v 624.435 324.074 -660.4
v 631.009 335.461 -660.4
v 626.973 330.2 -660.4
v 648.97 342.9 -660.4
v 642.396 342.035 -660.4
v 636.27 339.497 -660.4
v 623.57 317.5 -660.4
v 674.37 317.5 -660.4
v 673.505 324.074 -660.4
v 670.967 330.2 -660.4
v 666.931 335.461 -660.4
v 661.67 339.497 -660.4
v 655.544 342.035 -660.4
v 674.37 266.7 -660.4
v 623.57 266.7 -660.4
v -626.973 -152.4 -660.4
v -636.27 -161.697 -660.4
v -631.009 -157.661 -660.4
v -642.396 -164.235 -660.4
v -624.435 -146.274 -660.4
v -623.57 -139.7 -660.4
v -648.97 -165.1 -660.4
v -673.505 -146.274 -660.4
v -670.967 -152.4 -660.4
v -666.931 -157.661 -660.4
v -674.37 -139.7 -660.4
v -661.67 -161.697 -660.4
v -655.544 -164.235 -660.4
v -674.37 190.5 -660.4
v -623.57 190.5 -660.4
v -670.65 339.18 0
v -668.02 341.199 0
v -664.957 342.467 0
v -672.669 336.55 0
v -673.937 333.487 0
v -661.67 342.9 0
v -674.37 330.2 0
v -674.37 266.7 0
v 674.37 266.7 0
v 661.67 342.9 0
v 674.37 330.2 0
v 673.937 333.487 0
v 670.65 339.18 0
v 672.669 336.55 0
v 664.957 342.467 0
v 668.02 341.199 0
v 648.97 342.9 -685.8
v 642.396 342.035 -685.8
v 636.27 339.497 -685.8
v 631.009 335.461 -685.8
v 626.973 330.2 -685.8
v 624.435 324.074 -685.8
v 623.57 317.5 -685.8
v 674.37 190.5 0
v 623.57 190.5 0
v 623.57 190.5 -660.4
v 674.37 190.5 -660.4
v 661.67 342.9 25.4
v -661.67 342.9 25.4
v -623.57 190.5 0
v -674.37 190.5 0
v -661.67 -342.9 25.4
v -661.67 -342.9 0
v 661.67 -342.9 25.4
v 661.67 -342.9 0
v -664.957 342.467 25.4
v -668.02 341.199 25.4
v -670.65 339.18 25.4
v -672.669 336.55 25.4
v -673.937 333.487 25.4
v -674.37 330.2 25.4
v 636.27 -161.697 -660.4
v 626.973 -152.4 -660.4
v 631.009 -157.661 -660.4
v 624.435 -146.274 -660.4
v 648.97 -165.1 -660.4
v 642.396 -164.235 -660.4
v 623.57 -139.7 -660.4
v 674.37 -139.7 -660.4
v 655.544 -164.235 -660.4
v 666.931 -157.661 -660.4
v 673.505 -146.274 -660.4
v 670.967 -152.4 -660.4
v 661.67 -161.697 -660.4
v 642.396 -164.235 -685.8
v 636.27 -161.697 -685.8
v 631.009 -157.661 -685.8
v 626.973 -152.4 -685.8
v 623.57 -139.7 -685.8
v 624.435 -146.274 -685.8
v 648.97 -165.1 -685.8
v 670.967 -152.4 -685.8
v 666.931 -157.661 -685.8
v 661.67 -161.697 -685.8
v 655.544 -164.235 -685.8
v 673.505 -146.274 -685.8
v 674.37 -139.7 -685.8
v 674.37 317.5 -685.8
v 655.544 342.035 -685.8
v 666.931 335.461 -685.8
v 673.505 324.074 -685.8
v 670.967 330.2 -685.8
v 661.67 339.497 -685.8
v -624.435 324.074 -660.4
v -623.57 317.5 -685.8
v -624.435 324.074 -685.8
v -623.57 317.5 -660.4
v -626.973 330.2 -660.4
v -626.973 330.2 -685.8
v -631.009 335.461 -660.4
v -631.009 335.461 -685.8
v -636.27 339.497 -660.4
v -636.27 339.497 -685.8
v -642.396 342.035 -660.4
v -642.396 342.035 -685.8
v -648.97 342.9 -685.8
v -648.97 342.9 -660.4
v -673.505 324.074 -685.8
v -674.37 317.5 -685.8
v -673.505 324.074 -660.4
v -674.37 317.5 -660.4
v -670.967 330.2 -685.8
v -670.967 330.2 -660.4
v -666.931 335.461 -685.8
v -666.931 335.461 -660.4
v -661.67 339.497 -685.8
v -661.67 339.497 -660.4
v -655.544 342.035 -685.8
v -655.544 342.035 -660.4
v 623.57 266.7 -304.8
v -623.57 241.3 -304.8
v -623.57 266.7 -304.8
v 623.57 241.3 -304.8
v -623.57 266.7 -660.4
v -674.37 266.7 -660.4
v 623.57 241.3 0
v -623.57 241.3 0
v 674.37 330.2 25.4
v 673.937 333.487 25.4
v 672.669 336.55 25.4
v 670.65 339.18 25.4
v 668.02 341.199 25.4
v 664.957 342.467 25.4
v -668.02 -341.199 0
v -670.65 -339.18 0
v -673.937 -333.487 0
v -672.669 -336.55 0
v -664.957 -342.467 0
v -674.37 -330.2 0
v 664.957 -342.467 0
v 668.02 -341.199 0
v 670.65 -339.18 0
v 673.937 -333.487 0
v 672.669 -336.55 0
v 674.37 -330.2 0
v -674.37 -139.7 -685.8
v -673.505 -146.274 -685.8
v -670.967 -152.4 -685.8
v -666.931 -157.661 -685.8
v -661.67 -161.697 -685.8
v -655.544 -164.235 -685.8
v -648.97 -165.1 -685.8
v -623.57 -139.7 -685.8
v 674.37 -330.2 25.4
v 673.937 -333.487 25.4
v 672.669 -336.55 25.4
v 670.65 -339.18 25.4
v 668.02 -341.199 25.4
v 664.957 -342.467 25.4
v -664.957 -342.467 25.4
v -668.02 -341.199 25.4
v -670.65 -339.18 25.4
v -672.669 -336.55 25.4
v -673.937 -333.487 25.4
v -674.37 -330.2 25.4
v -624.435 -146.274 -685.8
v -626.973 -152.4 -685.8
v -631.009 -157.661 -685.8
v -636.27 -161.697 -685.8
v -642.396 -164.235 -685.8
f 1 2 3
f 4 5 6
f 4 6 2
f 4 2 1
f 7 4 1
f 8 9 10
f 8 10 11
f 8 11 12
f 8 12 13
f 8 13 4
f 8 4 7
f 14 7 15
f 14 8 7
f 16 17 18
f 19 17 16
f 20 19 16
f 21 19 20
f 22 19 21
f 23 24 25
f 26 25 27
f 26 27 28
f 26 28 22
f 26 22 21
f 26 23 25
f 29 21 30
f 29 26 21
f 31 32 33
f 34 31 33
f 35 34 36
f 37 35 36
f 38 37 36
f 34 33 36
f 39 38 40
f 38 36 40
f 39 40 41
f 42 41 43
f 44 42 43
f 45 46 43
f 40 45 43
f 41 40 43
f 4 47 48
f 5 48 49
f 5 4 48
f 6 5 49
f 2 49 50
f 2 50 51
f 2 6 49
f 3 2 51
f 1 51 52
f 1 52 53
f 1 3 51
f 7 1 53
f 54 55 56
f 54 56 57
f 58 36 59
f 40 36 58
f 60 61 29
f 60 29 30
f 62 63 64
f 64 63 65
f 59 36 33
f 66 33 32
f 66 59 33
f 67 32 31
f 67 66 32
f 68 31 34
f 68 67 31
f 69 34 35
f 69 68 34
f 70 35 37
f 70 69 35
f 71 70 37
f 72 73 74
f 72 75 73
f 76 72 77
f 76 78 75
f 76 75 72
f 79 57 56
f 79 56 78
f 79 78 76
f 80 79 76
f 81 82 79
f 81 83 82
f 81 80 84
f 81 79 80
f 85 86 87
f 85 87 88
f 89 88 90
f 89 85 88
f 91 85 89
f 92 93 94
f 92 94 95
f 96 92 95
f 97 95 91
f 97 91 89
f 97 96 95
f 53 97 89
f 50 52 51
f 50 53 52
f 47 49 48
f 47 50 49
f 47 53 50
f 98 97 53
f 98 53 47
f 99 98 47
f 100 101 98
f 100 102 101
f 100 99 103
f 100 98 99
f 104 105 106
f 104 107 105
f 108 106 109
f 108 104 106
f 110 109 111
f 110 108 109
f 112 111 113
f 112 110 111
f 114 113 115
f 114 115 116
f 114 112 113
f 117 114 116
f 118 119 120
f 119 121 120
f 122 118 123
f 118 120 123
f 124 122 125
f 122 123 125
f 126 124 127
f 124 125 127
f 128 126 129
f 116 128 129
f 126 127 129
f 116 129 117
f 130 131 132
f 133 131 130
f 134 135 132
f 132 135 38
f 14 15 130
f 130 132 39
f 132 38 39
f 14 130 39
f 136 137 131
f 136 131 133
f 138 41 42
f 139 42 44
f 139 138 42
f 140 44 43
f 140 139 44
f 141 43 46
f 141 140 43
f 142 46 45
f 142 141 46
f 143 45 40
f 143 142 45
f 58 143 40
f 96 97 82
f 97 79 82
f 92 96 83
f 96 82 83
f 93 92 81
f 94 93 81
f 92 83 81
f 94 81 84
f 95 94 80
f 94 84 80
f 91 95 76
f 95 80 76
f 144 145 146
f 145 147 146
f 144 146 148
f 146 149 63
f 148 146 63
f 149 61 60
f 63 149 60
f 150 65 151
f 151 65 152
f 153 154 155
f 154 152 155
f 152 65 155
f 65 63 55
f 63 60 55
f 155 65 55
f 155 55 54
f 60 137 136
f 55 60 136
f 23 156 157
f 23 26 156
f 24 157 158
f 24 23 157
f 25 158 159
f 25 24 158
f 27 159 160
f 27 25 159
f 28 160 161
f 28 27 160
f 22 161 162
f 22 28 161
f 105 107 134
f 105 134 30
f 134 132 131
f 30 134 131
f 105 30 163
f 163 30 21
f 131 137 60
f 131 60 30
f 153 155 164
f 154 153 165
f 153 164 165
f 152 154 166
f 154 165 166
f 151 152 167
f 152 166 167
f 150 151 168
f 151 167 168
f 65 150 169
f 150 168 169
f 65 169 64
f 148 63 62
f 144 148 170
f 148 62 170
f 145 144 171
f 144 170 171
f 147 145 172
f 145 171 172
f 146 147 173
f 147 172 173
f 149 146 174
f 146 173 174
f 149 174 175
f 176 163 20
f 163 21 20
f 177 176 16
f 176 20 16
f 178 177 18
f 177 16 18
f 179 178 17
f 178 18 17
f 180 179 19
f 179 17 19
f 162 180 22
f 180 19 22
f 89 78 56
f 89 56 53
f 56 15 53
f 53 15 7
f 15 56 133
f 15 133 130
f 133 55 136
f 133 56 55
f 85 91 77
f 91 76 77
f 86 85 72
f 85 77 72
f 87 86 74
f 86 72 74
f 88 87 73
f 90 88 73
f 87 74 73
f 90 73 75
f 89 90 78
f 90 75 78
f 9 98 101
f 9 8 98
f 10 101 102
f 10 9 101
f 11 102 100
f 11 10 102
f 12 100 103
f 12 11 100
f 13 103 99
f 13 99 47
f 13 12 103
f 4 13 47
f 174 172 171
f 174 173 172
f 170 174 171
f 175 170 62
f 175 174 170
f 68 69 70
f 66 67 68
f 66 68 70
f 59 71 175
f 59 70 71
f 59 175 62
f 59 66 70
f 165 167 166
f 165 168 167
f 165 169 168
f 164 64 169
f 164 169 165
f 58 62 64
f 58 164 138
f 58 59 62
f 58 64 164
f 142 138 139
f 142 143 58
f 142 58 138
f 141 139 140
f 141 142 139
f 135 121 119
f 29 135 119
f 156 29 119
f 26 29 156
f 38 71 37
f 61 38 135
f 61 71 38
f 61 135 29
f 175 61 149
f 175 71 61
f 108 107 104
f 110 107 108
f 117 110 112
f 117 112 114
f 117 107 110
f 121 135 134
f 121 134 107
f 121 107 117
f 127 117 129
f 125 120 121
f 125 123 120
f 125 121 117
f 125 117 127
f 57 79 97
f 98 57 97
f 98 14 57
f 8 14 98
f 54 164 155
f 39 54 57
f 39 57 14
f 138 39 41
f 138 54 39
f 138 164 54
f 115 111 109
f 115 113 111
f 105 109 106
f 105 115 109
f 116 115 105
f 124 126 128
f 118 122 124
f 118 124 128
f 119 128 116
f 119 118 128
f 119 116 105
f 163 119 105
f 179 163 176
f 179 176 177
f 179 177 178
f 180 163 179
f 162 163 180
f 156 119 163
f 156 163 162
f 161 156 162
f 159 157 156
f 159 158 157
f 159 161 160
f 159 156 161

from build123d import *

# Parameters (mm, degrees)
F0_W     = 1348.74
F0_H     = 685.8
F1_DEPTH = 25.4
F2_W     = 50.8
F2_H     = 76.2
F3_DEPTH = 711.2
F4_W     = 508
F4_H     = 25.4
F4_W_2   = 76.2
F5_DEPTH = 50.8
F6_W     = 355.6
F6_H     = 25.4
F6_W_2   = 76.2
F7_DEPTH = 50.8
F8_W     = 1348.74
F8_H     = 25.4
F9_DEPTH = 304.8
F10_R    = 12.7
F11_R    = 25.39999


# Not quite as in the source:
# - a fillet or chamfer is up to 0.001 mm smaller than in the source, because OpenCascade refuses the exact size


with BuildPart() as f1:
    # F0 (on Top) → F1 (new body)
    with BuildSketch(Plane.XY):
        Rectangle(F0_W, F0_H)
    extrude(amount=F1_DEPTH)

    # F2 (on face) → F3 (join)
    with BuildSketch(Plane.XY.offset(25.4)):
        with Locations((-648.97, 228.6)):
            Rectangle(F2_W, F2_H)
        with Locations((648.97, 228.6)):
            Rectangle(F2_W, F2_H)
    extrude(amount=-F3_DEPTH)

    # F4 (on face) → F5 (join)
    with BuildSketch(Plane(origin=(-674.37, 0, 0), x_dir=(0, -1, 0), z_dir=(-1, 0, 0))):
        with Locations((-88.9, -673.1)):
            Rectangle(F4_W, F4_H)
        with Locations((-304.8, -673.1)):
            Rectangle(F4_W_2, F4_H)
    extrude(amount=-F5_DEPTH)

    # F6 (on face) → F7 (join)
    with BuildSketch(Plane.YZ.offset(674.37)):
        with Locations((12.7, -673.1)):
            Rectangle(F6_W, F6_H)
        with Locations((228.6, -673.1)):
            Rectangle(F6_W_2, F6_H)
        with Locations((304.8, -673.1)):
            Rectangle(F6_W_2, F6_H)
    extrude(amount=-F7_DEPTH)

    # F8 (on face) → F9 (join)
    with BuildSketch(Plane(origin=(0, 0, 0), x_dir=(1, 0, 0), z_dir=(0, 0, -1))):
        with Locations((0, -254)):
            Rectangle(F8_W, F8_H)
    extrude(amount=F9_DEPTH)

    # F10
    f10_edges = [f1.edges().sort_by_distance(p)[0] for p in [
        (674.37, -342.9, 12.7),
        (-674.37, -342.9, 12.7),
        (-674.37, 342.9, 12.7),
        (674.37, 342.9, 12.7),
    ]]
    fillet(f10_edges, radius=F10_R)

    # F11 (radius 25.4 in the source; OpenCascade refuses exactly that, so slightly less here)
    f11_edges = [f1.edges().sort_by_distance(p)[0] for p in [
        (-623.57, -165.1, -673.1),
        (-674.37, -165.1, -673.1),
        (674.37, -165.1, -673.1),
        (623.57, -165.1, -673.1),
        (674.37, 342.9, -673.1),
        (623.57, 342.9, -673.1),
        (-674.37, 342.9, -673.1),
        (-623.57, 342.9, -673.1),
    ]]
    fillet(f11_edges, radius=F11_R)


solid = f1.part
